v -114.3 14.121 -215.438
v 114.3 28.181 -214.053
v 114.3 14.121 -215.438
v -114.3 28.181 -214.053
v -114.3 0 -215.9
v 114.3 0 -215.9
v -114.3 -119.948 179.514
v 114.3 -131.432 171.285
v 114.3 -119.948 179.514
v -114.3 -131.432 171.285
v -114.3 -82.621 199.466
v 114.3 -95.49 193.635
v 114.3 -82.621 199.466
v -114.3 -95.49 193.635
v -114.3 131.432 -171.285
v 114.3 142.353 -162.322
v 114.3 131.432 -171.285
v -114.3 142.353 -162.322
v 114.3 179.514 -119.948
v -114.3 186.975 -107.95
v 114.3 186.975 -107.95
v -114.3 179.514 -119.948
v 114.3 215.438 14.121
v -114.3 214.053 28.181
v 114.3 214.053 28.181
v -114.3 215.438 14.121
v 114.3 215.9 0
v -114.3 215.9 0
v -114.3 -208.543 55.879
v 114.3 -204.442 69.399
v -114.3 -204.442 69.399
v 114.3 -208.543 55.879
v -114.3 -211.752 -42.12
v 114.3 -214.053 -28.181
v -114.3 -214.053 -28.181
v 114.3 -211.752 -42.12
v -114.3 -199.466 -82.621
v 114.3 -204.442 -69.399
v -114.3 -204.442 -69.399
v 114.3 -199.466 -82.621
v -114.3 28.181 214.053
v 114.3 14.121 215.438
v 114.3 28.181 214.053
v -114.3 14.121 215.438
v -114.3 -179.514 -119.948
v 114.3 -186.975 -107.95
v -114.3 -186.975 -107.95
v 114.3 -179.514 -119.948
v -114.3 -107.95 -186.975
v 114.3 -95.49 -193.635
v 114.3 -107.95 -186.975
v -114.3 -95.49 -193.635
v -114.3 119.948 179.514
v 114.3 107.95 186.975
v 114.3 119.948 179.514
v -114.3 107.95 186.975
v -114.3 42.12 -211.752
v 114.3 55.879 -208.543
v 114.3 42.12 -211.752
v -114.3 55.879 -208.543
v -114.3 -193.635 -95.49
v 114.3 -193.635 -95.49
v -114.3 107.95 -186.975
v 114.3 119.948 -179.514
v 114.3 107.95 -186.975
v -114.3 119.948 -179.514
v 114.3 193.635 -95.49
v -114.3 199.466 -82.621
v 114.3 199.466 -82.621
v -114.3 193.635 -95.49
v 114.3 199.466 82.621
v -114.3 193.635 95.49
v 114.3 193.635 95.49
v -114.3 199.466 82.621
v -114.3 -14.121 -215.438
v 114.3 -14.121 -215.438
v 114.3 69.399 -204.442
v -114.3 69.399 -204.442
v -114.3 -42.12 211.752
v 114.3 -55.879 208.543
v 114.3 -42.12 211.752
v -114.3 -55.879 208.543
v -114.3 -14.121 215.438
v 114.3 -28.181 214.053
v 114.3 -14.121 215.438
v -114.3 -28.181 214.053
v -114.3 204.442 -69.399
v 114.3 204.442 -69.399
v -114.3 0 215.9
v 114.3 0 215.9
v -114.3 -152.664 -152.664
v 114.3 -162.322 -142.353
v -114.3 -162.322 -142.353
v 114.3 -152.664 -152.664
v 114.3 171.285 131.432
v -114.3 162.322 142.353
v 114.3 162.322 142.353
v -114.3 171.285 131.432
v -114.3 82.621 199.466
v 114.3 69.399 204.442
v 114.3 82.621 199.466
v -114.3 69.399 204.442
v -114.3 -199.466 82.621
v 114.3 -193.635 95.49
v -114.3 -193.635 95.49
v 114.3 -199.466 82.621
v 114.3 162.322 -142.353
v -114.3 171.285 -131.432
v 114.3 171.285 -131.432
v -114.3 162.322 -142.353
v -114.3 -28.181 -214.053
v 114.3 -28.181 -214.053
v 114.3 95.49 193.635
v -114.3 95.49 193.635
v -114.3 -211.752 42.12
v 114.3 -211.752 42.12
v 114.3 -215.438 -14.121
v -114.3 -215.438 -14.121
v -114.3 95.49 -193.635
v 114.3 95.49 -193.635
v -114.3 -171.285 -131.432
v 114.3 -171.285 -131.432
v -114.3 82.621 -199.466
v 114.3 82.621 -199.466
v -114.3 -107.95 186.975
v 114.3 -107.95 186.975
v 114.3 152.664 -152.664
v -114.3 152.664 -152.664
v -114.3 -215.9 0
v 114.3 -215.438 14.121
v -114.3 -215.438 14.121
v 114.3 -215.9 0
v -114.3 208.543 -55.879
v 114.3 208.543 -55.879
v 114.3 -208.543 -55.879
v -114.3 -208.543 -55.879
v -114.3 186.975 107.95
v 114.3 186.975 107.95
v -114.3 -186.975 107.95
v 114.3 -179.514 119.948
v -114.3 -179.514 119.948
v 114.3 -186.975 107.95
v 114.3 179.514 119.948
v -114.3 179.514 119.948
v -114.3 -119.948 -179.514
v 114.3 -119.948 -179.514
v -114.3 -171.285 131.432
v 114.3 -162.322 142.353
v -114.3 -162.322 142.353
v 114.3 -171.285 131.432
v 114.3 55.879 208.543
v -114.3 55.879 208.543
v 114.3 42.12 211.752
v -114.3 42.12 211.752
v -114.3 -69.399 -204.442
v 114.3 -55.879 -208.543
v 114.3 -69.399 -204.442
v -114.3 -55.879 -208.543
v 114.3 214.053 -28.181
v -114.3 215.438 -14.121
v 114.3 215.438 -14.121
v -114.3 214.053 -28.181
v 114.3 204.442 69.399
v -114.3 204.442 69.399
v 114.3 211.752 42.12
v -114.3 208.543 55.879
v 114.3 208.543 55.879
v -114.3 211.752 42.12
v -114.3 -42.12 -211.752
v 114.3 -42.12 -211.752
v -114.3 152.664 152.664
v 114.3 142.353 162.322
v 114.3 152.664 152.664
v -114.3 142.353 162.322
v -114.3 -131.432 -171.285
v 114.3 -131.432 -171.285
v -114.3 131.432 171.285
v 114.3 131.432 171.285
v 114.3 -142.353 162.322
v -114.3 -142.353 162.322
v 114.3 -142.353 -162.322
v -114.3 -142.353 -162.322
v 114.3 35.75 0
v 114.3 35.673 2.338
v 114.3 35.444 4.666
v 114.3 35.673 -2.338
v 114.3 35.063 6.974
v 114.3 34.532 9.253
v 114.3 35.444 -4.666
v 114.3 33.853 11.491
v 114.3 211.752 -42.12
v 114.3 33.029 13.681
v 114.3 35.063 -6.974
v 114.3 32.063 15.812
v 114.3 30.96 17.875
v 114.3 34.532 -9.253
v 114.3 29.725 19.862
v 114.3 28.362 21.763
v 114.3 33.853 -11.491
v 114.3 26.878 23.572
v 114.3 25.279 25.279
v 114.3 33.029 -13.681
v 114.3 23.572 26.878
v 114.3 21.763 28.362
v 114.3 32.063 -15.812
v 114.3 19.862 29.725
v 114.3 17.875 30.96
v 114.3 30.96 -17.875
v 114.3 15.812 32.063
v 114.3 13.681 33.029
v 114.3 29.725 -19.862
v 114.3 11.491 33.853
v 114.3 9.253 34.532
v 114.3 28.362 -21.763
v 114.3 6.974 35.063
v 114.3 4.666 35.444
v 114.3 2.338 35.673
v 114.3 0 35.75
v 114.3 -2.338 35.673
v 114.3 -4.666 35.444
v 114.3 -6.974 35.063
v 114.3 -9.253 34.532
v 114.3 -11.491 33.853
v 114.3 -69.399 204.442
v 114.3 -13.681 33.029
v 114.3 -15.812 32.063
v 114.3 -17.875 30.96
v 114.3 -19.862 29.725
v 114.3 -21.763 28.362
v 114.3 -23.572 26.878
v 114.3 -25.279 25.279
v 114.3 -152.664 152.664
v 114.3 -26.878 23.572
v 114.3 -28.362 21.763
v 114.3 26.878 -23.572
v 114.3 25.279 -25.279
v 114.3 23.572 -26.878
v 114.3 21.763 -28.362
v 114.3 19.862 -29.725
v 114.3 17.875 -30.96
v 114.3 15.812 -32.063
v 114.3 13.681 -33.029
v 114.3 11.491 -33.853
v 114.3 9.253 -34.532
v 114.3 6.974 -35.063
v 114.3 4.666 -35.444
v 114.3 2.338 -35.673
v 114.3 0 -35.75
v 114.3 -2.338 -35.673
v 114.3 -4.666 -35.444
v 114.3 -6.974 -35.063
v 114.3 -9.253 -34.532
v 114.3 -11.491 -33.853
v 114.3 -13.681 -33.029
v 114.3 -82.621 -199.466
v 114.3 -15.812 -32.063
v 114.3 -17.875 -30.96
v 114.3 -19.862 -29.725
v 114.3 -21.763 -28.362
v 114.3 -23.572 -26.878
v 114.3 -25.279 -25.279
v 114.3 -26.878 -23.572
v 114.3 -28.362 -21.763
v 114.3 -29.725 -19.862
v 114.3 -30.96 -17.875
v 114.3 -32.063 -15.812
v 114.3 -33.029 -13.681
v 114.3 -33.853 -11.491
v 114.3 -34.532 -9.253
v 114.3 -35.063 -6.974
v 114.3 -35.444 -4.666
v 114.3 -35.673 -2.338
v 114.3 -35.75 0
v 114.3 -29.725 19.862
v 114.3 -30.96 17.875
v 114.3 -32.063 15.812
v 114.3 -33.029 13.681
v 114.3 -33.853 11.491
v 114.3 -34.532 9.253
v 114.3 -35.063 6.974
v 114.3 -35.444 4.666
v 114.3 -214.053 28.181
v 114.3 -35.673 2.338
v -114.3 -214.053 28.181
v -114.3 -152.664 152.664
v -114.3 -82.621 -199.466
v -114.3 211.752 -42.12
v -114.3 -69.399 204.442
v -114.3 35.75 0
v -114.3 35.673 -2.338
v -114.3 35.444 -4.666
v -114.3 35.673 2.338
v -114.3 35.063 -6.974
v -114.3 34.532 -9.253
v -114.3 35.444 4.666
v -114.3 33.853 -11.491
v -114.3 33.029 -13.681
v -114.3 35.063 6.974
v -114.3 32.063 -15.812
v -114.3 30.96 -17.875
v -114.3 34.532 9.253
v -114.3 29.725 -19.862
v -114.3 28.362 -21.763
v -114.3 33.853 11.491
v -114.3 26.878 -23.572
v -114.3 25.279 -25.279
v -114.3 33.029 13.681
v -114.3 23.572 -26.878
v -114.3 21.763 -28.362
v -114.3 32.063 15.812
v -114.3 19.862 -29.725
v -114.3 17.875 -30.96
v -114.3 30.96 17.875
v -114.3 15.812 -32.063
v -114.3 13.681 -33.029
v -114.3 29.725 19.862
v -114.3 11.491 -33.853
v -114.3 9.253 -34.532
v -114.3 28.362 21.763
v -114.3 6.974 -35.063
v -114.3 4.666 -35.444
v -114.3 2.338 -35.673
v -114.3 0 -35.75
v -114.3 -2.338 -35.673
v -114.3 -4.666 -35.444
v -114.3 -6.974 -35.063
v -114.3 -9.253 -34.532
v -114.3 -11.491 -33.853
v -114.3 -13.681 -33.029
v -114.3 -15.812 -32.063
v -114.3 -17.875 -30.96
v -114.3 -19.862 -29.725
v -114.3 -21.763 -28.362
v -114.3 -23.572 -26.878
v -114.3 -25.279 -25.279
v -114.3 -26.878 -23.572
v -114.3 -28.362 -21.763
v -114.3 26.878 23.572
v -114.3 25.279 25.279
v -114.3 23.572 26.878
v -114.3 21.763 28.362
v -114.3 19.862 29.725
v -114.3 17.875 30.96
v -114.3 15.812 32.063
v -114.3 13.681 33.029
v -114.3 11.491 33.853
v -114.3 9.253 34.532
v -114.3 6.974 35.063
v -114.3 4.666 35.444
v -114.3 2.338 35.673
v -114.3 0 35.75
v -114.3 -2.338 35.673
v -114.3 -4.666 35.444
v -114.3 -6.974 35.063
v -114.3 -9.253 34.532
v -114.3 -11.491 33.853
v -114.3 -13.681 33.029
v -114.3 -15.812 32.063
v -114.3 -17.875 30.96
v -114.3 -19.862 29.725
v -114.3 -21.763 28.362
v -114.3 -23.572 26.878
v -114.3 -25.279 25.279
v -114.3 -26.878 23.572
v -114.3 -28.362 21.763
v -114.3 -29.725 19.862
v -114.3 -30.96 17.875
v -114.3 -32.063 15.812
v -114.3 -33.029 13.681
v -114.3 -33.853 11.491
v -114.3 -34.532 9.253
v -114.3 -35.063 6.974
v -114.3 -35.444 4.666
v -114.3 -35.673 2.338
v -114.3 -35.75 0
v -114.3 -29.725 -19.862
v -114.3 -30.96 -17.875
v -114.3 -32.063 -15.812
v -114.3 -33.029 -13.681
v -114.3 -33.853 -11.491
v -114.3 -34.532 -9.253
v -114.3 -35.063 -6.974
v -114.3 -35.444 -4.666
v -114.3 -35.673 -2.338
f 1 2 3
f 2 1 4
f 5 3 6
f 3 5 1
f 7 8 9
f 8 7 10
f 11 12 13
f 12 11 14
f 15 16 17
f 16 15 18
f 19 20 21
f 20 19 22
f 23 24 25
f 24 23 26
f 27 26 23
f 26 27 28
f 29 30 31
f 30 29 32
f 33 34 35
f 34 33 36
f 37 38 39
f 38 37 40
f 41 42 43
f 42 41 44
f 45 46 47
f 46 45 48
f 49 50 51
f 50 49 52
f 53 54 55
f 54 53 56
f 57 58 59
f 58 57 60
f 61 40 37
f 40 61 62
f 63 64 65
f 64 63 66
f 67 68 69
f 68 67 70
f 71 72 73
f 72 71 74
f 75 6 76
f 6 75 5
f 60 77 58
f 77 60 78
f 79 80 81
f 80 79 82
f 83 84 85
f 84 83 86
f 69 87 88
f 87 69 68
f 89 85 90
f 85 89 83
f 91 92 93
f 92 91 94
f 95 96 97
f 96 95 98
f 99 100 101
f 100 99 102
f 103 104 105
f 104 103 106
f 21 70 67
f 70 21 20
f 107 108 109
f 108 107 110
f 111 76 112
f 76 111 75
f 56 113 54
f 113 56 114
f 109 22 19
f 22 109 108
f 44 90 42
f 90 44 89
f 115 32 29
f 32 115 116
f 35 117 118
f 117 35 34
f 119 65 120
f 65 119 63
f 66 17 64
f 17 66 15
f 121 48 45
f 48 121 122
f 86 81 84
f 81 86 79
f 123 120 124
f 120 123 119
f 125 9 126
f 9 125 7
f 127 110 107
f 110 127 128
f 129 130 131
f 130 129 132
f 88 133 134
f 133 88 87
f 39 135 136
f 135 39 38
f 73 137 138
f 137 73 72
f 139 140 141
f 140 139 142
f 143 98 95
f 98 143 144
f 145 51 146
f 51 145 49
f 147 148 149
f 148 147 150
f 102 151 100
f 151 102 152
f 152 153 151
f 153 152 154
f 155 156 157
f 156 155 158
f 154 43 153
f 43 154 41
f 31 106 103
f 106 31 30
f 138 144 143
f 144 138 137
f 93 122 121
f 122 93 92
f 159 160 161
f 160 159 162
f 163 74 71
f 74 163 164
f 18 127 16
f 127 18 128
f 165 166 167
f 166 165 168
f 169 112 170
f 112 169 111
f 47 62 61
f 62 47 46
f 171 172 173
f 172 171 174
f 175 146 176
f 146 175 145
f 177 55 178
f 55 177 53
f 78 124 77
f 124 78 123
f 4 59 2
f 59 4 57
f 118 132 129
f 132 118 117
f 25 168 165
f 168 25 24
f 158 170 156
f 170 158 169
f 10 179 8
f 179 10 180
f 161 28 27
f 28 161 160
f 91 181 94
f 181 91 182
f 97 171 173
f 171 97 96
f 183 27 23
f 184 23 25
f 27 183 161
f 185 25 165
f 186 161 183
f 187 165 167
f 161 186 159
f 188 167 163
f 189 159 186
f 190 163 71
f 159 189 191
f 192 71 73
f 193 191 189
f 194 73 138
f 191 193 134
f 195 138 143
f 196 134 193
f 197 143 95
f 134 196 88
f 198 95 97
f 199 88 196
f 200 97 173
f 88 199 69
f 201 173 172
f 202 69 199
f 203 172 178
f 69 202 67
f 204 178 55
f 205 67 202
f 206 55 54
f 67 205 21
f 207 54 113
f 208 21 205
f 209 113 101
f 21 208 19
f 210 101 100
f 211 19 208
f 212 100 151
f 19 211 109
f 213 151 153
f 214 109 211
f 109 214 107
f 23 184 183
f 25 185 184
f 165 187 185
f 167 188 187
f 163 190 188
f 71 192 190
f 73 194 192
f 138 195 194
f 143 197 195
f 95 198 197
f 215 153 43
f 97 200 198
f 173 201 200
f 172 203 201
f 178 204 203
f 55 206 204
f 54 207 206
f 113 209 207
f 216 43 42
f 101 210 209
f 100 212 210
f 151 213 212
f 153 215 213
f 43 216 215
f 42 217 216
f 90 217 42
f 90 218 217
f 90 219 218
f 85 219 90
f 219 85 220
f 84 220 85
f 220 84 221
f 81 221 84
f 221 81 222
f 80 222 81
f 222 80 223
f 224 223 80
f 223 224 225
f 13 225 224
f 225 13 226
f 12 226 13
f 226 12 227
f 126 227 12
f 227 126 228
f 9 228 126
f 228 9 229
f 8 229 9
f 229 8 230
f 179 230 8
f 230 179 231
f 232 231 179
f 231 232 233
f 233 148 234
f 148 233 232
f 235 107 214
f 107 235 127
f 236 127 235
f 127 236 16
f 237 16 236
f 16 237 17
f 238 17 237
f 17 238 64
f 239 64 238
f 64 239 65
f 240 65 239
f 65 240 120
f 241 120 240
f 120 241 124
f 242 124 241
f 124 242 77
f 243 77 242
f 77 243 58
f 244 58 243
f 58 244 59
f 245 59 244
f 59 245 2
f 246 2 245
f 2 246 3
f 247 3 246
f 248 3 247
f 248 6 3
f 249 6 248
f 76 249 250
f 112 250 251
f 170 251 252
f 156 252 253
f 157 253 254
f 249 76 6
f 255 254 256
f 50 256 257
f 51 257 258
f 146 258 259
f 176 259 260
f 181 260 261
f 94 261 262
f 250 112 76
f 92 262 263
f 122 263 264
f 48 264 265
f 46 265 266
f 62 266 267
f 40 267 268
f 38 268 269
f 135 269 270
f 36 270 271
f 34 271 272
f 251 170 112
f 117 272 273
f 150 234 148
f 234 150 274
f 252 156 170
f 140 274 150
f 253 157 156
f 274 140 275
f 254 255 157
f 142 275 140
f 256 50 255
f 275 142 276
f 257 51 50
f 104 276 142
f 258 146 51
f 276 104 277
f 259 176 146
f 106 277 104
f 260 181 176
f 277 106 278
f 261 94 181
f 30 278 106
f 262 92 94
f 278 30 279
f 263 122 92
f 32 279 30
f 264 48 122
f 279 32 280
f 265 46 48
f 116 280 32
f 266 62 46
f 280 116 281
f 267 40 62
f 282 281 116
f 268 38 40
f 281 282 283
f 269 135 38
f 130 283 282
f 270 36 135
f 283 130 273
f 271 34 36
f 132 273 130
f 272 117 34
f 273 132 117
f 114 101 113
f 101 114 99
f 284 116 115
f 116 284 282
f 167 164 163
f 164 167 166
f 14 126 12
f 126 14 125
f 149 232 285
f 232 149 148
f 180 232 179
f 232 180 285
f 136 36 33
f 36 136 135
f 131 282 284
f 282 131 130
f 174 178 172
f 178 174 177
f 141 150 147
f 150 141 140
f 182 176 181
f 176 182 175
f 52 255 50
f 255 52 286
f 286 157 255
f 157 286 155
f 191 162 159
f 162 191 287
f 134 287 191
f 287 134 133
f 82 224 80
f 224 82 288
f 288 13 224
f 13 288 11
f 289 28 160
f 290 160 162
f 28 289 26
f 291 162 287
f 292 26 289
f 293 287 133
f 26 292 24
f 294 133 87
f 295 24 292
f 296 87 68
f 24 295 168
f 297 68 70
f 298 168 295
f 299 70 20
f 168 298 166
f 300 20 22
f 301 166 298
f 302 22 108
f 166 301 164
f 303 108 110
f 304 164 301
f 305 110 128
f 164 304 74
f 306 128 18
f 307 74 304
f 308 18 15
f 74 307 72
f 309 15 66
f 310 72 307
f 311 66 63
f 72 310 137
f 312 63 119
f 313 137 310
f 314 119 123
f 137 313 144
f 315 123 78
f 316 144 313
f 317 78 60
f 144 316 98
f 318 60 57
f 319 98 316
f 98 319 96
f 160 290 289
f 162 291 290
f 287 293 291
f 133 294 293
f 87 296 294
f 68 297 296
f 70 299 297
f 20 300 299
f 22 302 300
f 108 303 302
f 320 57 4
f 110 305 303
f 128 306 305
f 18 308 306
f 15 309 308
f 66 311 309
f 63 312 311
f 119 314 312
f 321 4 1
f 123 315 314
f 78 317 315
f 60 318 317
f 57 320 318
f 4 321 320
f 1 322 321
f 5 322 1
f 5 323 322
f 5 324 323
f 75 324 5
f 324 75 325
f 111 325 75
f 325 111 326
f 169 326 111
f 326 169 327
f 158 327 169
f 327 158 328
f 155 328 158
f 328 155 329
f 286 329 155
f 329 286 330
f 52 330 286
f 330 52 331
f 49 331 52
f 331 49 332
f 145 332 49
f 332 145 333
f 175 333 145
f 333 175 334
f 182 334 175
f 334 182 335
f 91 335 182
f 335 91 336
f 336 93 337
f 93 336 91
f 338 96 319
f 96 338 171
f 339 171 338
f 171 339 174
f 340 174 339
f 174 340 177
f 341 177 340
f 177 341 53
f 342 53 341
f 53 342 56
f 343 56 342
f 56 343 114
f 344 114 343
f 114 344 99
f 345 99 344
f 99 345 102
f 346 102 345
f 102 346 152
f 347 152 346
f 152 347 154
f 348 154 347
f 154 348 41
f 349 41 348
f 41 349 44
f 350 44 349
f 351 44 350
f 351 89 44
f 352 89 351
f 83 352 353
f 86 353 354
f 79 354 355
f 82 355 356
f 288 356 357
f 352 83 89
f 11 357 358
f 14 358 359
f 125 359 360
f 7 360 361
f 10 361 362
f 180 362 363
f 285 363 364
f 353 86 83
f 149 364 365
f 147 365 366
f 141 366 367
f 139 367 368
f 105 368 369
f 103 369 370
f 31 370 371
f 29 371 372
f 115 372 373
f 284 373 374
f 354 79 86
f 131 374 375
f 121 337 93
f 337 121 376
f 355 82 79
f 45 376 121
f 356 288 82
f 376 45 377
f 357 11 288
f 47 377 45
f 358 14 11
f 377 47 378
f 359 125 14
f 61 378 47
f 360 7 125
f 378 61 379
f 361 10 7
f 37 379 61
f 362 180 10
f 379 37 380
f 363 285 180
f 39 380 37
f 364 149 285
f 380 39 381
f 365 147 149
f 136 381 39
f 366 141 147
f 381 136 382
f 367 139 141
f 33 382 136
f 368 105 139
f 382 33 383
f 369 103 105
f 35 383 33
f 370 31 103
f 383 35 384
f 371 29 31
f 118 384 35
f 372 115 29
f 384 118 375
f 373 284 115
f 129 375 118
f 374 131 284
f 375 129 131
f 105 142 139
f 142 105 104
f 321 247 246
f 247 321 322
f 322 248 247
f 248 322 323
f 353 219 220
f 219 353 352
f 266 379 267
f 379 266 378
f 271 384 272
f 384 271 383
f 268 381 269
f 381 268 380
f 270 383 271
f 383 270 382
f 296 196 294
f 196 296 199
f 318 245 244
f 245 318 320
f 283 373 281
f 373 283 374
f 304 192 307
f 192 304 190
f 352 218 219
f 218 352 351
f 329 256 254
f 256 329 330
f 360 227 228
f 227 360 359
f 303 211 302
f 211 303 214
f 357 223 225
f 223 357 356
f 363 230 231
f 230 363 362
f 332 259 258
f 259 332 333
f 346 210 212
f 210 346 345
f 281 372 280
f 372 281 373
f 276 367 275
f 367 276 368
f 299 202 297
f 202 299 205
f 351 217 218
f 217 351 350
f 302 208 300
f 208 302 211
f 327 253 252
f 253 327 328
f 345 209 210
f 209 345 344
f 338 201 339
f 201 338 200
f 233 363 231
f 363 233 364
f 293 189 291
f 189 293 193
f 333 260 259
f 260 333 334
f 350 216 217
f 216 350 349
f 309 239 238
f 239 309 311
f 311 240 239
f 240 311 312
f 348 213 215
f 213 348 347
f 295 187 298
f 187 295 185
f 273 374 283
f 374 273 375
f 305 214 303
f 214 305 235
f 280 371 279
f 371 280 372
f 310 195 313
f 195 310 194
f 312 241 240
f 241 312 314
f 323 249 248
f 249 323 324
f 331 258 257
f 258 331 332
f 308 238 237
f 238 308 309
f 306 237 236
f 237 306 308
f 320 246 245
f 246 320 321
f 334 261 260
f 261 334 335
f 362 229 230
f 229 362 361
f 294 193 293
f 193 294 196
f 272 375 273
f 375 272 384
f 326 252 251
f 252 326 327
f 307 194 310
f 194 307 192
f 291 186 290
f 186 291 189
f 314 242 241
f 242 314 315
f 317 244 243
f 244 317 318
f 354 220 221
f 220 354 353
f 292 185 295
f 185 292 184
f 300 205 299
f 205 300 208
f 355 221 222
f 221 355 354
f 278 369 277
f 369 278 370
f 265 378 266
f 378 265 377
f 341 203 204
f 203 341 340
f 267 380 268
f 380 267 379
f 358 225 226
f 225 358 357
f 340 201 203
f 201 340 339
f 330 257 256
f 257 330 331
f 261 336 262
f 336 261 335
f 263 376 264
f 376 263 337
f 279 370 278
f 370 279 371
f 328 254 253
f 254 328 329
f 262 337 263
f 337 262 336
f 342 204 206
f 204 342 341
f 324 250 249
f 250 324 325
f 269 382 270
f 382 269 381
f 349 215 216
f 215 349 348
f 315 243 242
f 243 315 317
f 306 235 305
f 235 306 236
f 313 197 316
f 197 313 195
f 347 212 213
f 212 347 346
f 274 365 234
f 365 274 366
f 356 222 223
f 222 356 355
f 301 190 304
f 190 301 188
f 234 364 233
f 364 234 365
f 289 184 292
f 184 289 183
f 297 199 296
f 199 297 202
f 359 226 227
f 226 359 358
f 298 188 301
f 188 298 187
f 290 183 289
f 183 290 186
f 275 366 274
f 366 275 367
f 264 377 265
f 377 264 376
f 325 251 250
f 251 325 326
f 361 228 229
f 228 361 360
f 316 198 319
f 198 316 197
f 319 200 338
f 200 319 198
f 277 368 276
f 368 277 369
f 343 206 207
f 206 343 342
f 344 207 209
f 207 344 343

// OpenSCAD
// Generated documentary F1 envelope proxy.
// Not manufacturing geometry, not dimensionally validated, not SimReady.
proxy_id = "COMP-FUCHS-37026.013";
$fn = 96;

rim_diameter_mm = 431.8;
rim_width_mm = 228.6;
centre_bore_mm = 71.5;

rotate([0, 90, 0])
difference() {
    cylinder(h = rim_width_mm, d = rim_diameter_mm, center = true);
    cylinder(h = rim_width_mm + 2, d = centre_bore_mm, center = true);
}
